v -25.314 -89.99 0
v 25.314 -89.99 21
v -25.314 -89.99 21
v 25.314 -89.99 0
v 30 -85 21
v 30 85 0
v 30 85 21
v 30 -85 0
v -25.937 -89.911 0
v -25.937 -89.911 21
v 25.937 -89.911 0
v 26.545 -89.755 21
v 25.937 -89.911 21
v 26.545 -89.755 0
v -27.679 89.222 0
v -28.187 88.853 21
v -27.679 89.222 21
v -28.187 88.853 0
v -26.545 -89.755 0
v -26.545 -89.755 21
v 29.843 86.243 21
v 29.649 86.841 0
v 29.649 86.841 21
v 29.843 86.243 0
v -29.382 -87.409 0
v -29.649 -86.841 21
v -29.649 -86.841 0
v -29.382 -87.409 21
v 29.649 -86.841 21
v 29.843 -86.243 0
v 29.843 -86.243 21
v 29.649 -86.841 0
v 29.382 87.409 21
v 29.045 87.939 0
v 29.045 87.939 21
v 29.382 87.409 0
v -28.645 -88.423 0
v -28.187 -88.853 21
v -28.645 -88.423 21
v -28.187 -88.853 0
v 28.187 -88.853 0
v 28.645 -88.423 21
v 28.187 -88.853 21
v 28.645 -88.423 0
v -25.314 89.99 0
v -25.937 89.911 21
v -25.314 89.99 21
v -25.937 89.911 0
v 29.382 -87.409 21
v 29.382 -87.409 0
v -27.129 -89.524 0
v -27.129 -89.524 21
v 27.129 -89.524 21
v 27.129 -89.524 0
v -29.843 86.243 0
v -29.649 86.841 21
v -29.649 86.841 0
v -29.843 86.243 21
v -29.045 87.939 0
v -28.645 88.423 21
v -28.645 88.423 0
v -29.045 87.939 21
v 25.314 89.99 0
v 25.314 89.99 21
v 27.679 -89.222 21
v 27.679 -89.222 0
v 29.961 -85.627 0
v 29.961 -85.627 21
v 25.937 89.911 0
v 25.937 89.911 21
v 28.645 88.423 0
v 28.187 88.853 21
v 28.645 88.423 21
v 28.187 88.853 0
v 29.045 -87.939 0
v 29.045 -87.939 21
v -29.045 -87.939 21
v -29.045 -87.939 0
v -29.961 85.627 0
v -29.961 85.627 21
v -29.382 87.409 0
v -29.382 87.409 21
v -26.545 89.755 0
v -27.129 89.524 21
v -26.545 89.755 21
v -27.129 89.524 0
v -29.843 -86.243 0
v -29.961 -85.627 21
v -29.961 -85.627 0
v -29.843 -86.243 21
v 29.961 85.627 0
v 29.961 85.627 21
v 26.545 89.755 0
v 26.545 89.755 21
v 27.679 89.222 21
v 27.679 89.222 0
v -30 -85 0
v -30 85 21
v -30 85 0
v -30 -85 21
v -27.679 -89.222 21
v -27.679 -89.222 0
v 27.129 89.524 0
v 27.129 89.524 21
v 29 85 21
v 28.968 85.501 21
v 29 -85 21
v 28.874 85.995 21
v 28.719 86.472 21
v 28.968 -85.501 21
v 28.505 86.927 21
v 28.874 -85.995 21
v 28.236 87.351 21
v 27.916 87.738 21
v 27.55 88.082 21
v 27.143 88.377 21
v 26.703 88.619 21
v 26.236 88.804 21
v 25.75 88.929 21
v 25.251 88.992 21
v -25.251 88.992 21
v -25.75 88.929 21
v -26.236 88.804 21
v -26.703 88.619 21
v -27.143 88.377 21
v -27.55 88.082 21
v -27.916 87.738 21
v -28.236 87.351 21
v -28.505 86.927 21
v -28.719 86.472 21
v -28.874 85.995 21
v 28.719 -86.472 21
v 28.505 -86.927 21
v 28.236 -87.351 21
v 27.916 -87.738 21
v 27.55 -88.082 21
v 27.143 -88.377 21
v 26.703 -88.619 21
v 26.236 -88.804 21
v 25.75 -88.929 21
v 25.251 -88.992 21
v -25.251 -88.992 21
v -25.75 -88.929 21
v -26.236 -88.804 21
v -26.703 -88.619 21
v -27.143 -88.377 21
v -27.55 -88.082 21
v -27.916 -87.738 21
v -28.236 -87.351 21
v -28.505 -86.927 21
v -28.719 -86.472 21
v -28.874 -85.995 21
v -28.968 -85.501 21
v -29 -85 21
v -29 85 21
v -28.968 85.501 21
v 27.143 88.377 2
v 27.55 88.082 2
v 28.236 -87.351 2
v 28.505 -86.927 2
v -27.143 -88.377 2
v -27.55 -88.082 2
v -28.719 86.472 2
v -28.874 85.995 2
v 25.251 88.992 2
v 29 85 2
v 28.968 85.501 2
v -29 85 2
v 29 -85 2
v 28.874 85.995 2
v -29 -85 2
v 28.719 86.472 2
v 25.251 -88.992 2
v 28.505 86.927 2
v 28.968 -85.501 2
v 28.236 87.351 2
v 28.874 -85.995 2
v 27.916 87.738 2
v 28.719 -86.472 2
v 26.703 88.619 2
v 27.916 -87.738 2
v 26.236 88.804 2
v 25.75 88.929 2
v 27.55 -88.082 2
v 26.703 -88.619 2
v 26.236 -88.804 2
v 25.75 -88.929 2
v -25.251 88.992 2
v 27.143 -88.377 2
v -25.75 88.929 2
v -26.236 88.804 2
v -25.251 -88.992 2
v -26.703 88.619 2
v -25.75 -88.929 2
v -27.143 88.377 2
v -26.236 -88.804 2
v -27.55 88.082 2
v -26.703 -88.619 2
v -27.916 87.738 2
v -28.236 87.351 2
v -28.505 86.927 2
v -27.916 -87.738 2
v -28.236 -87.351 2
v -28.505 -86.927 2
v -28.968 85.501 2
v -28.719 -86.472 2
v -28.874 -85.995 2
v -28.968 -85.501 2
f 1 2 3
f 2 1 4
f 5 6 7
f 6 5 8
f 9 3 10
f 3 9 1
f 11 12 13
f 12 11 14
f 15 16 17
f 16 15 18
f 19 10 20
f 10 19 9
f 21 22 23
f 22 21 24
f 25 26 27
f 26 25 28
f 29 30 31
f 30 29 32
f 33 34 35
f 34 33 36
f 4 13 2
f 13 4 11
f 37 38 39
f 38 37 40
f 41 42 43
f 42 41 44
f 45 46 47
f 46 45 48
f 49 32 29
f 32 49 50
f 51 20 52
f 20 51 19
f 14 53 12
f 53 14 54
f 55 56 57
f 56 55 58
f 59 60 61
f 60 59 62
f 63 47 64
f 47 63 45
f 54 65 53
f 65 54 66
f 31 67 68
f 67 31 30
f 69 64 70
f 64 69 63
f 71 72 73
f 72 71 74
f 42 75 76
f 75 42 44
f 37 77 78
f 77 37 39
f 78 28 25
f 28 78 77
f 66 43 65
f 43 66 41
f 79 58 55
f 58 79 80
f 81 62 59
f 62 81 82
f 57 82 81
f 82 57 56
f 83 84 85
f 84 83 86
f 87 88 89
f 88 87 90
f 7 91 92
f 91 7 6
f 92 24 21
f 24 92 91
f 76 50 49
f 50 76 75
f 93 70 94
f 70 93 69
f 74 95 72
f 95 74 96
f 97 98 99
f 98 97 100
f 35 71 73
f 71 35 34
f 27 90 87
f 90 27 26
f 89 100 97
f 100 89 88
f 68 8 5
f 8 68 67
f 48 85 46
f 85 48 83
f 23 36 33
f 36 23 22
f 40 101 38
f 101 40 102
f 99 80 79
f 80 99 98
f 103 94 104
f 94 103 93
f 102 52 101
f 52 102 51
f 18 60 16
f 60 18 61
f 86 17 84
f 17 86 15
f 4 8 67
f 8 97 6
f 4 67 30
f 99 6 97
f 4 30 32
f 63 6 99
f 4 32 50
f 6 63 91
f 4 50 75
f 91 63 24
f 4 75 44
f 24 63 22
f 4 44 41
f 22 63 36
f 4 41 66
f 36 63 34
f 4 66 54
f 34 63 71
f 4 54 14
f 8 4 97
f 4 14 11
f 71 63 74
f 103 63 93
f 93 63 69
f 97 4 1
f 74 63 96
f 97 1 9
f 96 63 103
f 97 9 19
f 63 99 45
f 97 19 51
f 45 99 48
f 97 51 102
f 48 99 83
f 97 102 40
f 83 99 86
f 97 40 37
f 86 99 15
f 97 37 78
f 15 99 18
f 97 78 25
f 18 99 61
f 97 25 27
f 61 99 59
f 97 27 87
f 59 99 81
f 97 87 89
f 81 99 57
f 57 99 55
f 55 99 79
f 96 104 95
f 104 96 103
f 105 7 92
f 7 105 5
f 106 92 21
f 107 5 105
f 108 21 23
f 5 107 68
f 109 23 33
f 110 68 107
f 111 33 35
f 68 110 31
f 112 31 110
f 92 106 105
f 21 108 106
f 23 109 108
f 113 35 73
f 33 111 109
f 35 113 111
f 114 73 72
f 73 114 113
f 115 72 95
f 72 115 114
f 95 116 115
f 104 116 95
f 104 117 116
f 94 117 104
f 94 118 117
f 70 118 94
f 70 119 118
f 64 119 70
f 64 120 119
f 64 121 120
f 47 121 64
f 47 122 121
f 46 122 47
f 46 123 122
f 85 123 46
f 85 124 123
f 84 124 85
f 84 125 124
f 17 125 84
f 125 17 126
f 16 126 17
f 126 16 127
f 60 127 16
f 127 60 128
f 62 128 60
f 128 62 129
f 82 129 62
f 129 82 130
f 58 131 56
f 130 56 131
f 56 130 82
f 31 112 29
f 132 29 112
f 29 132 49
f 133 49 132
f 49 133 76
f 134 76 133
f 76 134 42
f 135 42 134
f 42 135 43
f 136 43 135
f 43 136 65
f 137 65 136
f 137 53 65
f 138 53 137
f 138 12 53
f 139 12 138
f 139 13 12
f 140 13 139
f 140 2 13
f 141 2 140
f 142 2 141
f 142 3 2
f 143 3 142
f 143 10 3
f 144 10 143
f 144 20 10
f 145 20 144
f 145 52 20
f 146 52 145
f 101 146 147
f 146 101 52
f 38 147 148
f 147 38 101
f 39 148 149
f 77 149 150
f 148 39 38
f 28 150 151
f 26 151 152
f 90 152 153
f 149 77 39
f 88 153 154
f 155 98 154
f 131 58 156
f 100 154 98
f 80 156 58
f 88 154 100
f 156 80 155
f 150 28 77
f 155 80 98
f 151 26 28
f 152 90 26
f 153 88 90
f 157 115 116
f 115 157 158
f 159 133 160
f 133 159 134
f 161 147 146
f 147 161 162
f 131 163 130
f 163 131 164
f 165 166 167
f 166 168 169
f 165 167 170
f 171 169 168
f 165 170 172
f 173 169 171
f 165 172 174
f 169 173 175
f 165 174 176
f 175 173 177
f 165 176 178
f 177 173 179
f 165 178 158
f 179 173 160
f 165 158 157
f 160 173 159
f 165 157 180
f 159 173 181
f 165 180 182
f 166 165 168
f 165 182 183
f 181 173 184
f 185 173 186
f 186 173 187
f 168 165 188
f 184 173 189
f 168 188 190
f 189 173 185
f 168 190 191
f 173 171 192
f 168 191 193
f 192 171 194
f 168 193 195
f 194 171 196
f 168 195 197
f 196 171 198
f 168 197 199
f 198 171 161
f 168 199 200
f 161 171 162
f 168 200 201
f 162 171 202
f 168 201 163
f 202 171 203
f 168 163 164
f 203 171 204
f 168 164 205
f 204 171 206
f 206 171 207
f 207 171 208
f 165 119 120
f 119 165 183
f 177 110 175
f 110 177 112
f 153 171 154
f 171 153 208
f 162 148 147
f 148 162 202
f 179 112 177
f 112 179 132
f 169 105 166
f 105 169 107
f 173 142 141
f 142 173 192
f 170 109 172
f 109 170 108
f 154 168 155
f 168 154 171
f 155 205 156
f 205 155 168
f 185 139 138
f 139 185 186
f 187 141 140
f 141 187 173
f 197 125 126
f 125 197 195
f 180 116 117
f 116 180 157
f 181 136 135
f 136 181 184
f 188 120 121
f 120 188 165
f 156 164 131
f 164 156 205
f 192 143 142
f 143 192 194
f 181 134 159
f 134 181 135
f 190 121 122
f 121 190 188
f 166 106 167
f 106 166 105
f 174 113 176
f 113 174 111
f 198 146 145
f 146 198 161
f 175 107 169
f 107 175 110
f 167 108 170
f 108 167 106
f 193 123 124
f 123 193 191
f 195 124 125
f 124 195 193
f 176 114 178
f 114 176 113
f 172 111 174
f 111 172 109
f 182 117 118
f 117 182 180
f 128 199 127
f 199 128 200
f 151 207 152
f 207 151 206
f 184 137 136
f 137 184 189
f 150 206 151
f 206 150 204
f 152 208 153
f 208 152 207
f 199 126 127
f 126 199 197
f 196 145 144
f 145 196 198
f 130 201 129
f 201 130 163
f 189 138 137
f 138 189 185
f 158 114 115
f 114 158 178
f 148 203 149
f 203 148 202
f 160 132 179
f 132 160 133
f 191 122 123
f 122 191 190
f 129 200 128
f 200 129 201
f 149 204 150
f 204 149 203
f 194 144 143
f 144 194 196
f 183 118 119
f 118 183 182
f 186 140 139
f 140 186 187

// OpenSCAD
$fn = 50;


difference() {
	union() {
		hull() {
			translate(v = [-25.0000000000, 85.0000000000, 0]) {
				cylinder(h = 21, r = 5);
			}
			translate(v = [25.0000000000, 85.0000000000, 0]) {
				cylinder(h = 21, r = 5);
			}
			translate(v = [-25.0000000000, -85.0000000000, 0]) {
				cylinder(h = 21, r = 5);
			}
			translate(v = [25.0000000000, -85.0000000000, 0]) {
				cylinder(h = 21, r = 5);
			}
		}
	}
	union() {
		translate(v = [0, 0, 2]) {
			hull() {
				translate(v = [-25.0000000000, 85.0000000000, 0]) {
					cylinder(h = 19, r = 4);
				}
				translate(v = [25.0000000000, 85.0000000000, 0]) {
					cylinder(h = 19, r = 4);
				}
				translate(v = [-25.0000000000, -85.0000000000, 0]) {
					cylinder(h = 19, r = 4);
				}
				translate(v = [25.0000000000, -85.0000000000, 0]) {
					cylinder(h = 19, r = 4);
				}
			}
		}
	}
}
